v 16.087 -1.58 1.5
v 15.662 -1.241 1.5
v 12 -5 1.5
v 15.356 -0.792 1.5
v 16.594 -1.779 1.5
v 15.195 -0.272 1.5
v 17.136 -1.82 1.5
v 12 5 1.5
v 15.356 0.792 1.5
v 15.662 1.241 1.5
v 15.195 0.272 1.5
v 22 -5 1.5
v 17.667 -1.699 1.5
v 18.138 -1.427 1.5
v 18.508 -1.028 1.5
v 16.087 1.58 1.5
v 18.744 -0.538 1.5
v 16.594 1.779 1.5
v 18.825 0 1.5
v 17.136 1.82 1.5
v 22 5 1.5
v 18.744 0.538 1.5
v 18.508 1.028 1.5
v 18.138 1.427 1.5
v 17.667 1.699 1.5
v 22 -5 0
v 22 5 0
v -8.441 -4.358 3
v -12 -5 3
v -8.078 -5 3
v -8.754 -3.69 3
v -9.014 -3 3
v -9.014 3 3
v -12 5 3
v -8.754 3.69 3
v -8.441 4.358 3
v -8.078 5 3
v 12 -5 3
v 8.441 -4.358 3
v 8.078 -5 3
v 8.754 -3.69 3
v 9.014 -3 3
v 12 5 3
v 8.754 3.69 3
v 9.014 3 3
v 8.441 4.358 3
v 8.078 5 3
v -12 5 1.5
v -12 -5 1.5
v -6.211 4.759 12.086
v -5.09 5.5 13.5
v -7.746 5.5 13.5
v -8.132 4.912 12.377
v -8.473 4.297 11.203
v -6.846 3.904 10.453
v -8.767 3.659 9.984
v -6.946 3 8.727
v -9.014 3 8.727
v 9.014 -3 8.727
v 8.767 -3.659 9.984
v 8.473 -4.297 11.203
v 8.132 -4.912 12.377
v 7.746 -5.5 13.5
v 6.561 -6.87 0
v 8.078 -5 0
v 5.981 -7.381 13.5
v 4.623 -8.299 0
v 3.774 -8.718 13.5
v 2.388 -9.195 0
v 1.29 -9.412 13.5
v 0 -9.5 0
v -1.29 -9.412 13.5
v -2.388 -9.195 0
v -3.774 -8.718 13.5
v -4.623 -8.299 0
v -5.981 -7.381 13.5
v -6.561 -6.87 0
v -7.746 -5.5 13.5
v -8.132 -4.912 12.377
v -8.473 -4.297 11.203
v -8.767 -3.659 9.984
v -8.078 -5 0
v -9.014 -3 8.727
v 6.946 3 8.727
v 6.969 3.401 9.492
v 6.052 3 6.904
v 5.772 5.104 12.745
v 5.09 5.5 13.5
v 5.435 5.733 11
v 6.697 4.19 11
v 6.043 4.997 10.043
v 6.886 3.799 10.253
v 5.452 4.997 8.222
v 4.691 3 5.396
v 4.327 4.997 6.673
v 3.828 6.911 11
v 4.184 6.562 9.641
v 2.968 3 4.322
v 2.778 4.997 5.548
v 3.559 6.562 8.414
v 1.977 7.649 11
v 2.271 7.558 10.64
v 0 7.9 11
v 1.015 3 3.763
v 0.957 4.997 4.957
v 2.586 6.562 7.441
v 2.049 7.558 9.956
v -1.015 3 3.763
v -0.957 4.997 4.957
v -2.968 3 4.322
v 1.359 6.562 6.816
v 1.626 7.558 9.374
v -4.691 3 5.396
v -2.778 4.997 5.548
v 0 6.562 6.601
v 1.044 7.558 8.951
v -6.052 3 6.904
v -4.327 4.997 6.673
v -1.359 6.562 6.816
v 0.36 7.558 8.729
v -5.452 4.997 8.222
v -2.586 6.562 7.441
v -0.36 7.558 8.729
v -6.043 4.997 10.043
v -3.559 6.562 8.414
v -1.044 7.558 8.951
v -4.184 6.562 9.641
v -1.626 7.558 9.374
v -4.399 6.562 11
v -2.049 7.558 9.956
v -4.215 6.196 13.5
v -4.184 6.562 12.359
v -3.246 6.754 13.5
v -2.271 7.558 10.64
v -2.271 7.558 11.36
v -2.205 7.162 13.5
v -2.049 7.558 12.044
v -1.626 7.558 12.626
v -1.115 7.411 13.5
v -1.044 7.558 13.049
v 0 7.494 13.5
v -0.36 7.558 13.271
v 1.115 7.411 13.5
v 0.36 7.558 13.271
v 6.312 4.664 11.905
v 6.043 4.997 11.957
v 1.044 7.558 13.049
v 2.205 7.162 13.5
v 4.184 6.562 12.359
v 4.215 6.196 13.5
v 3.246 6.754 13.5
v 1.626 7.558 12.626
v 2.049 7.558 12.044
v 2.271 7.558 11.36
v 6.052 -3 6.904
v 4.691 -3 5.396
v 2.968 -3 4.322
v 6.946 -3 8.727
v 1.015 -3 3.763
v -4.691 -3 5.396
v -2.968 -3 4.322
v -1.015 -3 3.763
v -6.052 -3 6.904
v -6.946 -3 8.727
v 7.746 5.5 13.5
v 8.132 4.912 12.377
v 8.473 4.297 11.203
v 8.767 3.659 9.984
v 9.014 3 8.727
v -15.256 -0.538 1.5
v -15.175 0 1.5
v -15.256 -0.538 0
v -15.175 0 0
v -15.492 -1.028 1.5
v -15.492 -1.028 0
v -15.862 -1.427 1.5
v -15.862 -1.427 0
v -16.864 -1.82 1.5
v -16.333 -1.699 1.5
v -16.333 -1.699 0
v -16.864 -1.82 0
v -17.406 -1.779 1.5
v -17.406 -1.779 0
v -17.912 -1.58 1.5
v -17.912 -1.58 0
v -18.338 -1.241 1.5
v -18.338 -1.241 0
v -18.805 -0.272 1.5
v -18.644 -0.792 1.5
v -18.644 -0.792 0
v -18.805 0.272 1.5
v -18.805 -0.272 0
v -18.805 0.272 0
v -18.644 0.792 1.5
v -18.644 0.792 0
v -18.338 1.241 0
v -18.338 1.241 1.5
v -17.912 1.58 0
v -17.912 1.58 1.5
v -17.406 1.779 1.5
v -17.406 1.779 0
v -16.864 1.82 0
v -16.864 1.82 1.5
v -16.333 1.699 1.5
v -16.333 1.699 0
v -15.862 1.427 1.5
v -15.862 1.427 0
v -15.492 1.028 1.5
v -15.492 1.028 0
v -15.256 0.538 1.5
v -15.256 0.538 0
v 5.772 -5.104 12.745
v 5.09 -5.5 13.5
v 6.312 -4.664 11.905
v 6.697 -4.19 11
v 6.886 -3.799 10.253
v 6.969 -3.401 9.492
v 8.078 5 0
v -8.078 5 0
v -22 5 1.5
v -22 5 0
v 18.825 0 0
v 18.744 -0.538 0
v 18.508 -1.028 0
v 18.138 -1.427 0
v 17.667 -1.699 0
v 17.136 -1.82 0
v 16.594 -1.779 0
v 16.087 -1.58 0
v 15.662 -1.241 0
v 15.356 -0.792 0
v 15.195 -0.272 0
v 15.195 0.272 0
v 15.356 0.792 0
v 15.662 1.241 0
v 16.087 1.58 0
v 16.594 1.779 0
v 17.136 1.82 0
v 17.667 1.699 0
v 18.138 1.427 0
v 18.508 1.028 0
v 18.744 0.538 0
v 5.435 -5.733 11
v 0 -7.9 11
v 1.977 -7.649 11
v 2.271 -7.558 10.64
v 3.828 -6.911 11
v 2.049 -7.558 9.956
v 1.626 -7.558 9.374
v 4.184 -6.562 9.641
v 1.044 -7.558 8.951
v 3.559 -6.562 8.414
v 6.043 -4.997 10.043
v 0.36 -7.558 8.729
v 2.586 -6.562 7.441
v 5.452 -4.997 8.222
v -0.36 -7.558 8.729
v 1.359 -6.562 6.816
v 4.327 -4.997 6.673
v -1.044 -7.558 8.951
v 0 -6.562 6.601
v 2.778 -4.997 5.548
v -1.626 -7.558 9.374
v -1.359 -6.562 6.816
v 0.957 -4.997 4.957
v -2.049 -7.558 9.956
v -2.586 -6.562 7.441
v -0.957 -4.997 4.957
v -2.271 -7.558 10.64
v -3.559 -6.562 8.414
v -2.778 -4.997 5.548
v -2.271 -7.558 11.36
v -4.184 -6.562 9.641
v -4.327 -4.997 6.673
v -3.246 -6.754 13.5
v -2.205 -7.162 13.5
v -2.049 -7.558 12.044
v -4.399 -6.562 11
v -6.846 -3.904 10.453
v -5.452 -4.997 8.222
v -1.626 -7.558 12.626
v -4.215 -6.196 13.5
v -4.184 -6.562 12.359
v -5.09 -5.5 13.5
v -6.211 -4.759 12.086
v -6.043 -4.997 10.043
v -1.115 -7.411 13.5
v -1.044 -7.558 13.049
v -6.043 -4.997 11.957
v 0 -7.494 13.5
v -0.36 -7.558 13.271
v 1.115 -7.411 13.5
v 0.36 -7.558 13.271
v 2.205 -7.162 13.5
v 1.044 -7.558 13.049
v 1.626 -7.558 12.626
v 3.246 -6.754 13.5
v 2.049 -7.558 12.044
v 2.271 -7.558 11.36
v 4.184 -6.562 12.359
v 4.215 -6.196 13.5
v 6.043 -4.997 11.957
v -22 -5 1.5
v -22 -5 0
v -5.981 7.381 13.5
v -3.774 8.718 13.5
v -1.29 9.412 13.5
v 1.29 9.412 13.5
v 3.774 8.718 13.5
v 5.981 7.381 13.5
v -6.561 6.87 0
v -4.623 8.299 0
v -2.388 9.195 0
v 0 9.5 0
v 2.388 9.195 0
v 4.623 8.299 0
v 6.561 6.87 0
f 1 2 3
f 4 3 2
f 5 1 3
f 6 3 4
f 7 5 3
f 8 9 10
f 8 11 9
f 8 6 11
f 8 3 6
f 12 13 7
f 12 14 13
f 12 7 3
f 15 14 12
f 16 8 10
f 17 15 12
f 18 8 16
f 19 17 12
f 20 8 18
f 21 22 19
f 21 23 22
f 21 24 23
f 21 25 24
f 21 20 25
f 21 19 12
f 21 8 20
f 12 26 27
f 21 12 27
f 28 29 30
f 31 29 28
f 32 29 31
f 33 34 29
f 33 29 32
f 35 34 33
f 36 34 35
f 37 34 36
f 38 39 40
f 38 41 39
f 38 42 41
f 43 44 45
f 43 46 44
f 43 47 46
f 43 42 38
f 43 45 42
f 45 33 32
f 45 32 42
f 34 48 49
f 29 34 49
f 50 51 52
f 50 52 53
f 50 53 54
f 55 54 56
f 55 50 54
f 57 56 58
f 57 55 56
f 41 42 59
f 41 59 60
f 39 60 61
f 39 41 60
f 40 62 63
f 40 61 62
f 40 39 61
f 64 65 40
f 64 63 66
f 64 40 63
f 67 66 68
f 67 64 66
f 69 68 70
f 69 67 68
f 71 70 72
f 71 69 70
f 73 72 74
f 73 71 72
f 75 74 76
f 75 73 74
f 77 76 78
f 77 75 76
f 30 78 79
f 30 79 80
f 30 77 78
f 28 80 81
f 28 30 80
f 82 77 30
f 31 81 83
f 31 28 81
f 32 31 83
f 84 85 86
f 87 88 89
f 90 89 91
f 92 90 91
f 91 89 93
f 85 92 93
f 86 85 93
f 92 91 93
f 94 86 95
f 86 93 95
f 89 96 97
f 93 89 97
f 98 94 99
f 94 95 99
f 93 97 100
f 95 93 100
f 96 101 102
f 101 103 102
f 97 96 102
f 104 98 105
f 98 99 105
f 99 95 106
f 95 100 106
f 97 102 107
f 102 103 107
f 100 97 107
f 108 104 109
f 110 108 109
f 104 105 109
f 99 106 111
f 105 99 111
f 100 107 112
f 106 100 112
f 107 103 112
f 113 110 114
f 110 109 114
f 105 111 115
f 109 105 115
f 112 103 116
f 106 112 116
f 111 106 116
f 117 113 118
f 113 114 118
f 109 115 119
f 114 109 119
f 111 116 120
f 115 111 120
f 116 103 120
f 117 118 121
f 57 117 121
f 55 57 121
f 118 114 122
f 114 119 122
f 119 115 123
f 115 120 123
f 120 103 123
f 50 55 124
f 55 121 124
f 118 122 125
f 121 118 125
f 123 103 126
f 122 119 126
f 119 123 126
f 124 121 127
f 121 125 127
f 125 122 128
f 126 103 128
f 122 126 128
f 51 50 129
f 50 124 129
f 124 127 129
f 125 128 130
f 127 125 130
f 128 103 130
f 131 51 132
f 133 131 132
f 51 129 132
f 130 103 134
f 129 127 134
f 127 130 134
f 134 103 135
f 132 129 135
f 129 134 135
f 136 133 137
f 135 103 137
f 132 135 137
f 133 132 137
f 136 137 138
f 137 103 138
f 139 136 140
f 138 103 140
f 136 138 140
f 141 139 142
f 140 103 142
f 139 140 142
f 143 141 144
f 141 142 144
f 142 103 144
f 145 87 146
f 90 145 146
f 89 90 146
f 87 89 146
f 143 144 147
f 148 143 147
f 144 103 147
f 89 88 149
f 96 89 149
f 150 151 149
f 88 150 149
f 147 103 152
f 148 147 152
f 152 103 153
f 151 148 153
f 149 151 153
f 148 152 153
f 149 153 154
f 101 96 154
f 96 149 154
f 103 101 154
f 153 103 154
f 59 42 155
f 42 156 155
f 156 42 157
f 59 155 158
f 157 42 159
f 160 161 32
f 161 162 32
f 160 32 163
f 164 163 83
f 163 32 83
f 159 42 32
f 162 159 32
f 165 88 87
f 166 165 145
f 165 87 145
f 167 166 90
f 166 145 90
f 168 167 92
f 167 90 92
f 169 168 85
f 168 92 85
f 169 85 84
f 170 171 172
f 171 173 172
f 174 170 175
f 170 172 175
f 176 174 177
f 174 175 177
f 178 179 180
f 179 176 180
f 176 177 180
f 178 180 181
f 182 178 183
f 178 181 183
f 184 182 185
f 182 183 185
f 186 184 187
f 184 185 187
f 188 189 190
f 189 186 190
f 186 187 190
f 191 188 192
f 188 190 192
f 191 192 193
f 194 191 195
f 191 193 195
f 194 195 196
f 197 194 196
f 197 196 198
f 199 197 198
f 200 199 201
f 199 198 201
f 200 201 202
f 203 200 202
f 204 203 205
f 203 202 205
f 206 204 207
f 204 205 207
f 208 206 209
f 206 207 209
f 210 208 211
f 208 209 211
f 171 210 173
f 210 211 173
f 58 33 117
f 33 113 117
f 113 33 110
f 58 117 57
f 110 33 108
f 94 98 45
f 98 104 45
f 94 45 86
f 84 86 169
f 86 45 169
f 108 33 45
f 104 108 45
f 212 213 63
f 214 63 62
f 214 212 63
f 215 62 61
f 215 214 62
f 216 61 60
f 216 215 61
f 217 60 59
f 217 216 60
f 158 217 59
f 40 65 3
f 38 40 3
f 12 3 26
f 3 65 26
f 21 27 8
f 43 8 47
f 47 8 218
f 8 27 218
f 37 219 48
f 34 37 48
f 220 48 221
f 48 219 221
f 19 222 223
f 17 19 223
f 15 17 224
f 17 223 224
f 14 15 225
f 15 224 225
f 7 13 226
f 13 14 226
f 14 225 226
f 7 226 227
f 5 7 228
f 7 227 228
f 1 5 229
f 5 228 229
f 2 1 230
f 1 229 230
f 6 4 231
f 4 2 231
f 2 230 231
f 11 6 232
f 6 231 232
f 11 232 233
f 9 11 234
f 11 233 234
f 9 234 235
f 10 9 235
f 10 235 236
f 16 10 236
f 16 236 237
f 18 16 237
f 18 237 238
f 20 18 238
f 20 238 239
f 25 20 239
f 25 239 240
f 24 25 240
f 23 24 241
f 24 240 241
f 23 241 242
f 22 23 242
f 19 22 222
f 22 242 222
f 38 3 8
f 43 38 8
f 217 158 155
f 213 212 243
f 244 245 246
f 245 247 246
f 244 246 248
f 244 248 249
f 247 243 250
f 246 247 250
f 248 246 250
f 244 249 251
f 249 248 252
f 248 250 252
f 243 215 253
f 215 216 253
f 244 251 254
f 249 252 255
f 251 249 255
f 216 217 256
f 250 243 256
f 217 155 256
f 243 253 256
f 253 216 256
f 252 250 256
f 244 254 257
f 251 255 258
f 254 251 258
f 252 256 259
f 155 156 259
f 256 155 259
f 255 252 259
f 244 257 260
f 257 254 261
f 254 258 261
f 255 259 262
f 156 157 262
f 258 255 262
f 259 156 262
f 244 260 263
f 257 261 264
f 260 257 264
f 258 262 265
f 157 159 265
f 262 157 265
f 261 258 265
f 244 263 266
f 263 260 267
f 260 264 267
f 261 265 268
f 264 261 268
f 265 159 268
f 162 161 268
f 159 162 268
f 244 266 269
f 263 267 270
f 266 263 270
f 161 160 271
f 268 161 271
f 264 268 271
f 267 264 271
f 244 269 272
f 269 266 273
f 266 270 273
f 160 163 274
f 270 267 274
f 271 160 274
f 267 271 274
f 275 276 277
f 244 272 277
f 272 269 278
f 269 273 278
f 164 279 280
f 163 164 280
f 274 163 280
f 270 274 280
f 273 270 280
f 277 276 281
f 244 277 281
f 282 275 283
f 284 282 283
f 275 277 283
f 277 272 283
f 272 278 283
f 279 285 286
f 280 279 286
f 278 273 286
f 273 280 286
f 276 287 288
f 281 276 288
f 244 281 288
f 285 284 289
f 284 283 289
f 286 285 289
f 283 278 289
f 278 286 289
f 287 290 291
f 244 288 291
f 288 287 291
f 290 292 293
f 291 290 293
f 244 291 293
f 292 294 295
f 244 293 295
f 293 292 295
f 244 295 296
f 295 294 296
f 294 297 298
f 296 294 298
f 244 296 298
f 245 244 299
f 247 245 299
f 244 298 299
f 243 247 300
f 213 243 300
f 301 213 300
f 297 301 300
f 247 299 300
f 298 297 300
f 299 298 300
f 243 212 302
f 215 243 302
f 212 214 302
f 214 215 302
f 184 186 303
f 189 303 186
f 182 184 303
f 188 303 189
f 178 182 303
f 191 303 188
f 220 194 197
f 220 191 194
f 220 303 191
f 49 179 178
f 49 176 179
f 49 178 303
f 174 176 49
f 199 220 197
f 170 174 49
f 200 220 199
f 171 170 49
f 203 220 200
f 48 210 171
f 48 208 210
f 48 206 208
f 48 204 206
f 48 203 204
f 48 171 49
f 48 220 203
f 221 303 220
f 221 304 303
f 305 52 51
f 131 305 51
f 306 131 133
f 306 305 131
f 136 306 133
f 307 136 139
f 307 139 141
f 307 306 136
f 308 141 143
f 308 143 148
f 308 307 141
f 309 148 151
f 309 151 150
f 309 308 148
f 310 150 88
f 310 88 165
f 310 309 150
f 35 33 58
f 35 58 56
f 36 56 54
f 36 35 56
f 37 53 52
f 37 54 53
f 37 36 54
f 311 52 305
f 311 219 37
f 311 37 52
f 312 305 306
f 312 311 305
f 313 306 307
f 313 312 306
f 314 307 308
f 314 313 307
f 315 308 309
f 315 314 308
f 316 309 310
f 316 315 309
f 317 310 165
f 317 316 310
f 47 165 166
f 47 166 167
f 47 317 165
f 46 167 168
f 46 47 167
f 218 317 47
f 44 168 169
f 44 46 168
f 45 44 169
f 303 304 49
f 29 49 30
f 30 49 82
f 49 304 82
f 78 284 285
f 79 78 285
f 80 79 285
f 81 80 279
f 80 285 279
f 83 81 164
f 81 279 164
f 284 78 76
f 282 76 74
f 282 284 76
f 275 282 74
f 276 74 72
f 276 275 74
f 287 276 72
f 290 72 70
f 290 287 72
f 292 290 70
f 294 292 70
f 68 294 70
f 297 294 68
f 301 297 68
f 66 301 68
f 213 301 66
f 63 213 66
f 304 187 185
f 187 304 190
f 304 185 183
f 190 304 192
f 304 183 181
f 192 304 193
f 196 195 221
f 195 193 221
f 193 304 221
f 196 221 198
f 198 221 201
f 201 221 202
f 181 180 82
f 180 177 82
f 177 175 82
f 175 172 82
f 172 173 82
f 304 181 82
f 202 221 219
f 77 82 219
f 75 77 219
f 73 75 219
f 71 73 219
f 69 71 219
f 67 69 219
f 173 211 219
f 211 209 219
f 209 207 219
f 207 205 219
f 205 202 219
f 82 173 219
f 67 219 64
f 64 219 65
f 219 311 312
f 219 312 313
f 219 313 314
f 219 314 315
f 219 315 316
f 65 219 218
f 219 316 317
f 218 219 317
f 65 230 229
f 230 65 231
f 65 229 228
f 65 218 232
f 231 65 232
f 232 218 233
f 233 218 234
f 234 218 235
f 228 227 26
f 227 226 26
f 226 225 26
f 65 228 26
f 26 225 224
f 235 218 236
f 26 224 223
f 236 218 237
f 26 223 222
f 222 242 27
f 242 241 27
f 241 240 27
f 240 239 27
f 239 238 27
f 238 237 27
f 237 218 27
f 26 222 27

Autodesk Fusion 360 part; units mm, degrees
sketch "Sketch1" plane through (0, 0, 0) normal (0, 0, 1) x (1, 0, 0)
  circle A0 centre (0, 0) radius 9.5
  line L0 (12, 5) -> (-12, 5)
  line L1 (-12, 5) -> (-12, -5)
  line L2 (-12, -5) -> (12, -5)
  line L3 (12, -5) -> (12, 5)
  line L4 (-12, -5) -> (-22, -5)
  line L5 (-22, -5) -> (-22, 5)
  line L6 (-22, 5) -> (-12, 5)
  line L7 (-12, 5) -> (-12, -5)
  line L8 (12, -5) -> (22, -5)
  line L9 (22, -5) -> (22, 5)
  line L10 (22, 5) -> (12, 5)
  line L11 (12, 5) -> (12, -5)
  circle A1 centre (17, 0) radius 1.825
  circle A2 centre (-17, 0) radius 1.825
  dimension "d1" = 19
  dimension "d2" = 5
  dimension "d3" = 5
  dimension "d4" = 12
  dimension "d19" = 24
  dimension "d20" = 3.65
  dimension "d21" = 3.65
extrude "Extrude1" add sketch "Sketch1" along normal blind 3 contours A0 L0 L2 L3 L11 | A0 L0 L1 L2 L7 makes body 1 at (-9.0078, 3.0183, 2) makes body 2 at (8.3, 4.6217, 2)
extrude "Extrude2" add sketch "Sketch1" along normal blind 13.5 contours A0 L0 L2 | A0 L0 | A0 L2 bodies 1 2
sketch "Sketch2" plane through (0, 0, 0) normal (0, 1, 0) x (1, 0, 0)
  line L0 (-9.5, -15) -> (9.5, -15)
  line L1 (9.5, -15) -> (9.5, 0)
  line L2 (9.5, 0) -> (-9.5, 0)
  line L3 (-9.5, 0) -> (-9.5, -15)
  line L4 (9.5, 0) -> (-9.5, 0)
  line L5 (-9.5, 0) -> (-9.5, -3)
  line L6 (-9.5, -3) -> (9.5, -3)
  line L7 (9.5, -3) -> (9.5, 0)
  line L8 (-9.5, -15) -> (9.5, -3)
  line L9 (-9.5, 0) -> (9.5, 0)
  dimension "d10" = 3
sphere "SpherePrimitive2" cut diameter 15.8 placed x (1, 0, 0) y (0, 0, -1) z (0, 1, 0) at (0, 0, 11) bodies 1
sketch "Sketch7" plane through (0, 0, 0) normal (1, 0, 0) x (0, 1, 0)
  line L0 (0, 3) -> (-3, 3)
  line L1 (-3, 3) -> (-3, 13.5)
  line L2 (-3, 13.5) -> (0, 13.5)
  line L3 (0, 13.5) -> (0, 3)
  line L4 (-5, 0) -> (-5, 3)
  line L5 (0, 15) -> (0, 0)
  line L6 (0, 3) -> (3, 3)
  line L7 (3, 3) -> (3, 13.5)
  line L8 (0, 13.5) -> (0, 3)
  line L9 (3, 13.5) -> (0, 13.5)
  line L10 (0, 13.5) -> (-5.5, 13.5)
  line L11 (-5.5, 13.5) -> (0, 3)
  line L12 (5.5, 13.5) -> (0, 3)
  line L13 (0, 13.5) -> (5.5, 13.5)
  dimension "d12" = 3
  dimension "d13" = 2
  dimension "d14" = 10.5
extrude "Extrude3" cut sketch "Sketch7" along normal blind 17 bodies 1
extrude "Extrude4" cut sketch "Sketch7" against normal blind 11 bodies 1
extrude "Extrude5" add sketch "Sketch1" along normal blind 1.5 contours L3 L8 L9 L10 L11 | L1 L4 L5 L6 L7 bodies 1
equation "d1 = 15 mm + 4 mm"
